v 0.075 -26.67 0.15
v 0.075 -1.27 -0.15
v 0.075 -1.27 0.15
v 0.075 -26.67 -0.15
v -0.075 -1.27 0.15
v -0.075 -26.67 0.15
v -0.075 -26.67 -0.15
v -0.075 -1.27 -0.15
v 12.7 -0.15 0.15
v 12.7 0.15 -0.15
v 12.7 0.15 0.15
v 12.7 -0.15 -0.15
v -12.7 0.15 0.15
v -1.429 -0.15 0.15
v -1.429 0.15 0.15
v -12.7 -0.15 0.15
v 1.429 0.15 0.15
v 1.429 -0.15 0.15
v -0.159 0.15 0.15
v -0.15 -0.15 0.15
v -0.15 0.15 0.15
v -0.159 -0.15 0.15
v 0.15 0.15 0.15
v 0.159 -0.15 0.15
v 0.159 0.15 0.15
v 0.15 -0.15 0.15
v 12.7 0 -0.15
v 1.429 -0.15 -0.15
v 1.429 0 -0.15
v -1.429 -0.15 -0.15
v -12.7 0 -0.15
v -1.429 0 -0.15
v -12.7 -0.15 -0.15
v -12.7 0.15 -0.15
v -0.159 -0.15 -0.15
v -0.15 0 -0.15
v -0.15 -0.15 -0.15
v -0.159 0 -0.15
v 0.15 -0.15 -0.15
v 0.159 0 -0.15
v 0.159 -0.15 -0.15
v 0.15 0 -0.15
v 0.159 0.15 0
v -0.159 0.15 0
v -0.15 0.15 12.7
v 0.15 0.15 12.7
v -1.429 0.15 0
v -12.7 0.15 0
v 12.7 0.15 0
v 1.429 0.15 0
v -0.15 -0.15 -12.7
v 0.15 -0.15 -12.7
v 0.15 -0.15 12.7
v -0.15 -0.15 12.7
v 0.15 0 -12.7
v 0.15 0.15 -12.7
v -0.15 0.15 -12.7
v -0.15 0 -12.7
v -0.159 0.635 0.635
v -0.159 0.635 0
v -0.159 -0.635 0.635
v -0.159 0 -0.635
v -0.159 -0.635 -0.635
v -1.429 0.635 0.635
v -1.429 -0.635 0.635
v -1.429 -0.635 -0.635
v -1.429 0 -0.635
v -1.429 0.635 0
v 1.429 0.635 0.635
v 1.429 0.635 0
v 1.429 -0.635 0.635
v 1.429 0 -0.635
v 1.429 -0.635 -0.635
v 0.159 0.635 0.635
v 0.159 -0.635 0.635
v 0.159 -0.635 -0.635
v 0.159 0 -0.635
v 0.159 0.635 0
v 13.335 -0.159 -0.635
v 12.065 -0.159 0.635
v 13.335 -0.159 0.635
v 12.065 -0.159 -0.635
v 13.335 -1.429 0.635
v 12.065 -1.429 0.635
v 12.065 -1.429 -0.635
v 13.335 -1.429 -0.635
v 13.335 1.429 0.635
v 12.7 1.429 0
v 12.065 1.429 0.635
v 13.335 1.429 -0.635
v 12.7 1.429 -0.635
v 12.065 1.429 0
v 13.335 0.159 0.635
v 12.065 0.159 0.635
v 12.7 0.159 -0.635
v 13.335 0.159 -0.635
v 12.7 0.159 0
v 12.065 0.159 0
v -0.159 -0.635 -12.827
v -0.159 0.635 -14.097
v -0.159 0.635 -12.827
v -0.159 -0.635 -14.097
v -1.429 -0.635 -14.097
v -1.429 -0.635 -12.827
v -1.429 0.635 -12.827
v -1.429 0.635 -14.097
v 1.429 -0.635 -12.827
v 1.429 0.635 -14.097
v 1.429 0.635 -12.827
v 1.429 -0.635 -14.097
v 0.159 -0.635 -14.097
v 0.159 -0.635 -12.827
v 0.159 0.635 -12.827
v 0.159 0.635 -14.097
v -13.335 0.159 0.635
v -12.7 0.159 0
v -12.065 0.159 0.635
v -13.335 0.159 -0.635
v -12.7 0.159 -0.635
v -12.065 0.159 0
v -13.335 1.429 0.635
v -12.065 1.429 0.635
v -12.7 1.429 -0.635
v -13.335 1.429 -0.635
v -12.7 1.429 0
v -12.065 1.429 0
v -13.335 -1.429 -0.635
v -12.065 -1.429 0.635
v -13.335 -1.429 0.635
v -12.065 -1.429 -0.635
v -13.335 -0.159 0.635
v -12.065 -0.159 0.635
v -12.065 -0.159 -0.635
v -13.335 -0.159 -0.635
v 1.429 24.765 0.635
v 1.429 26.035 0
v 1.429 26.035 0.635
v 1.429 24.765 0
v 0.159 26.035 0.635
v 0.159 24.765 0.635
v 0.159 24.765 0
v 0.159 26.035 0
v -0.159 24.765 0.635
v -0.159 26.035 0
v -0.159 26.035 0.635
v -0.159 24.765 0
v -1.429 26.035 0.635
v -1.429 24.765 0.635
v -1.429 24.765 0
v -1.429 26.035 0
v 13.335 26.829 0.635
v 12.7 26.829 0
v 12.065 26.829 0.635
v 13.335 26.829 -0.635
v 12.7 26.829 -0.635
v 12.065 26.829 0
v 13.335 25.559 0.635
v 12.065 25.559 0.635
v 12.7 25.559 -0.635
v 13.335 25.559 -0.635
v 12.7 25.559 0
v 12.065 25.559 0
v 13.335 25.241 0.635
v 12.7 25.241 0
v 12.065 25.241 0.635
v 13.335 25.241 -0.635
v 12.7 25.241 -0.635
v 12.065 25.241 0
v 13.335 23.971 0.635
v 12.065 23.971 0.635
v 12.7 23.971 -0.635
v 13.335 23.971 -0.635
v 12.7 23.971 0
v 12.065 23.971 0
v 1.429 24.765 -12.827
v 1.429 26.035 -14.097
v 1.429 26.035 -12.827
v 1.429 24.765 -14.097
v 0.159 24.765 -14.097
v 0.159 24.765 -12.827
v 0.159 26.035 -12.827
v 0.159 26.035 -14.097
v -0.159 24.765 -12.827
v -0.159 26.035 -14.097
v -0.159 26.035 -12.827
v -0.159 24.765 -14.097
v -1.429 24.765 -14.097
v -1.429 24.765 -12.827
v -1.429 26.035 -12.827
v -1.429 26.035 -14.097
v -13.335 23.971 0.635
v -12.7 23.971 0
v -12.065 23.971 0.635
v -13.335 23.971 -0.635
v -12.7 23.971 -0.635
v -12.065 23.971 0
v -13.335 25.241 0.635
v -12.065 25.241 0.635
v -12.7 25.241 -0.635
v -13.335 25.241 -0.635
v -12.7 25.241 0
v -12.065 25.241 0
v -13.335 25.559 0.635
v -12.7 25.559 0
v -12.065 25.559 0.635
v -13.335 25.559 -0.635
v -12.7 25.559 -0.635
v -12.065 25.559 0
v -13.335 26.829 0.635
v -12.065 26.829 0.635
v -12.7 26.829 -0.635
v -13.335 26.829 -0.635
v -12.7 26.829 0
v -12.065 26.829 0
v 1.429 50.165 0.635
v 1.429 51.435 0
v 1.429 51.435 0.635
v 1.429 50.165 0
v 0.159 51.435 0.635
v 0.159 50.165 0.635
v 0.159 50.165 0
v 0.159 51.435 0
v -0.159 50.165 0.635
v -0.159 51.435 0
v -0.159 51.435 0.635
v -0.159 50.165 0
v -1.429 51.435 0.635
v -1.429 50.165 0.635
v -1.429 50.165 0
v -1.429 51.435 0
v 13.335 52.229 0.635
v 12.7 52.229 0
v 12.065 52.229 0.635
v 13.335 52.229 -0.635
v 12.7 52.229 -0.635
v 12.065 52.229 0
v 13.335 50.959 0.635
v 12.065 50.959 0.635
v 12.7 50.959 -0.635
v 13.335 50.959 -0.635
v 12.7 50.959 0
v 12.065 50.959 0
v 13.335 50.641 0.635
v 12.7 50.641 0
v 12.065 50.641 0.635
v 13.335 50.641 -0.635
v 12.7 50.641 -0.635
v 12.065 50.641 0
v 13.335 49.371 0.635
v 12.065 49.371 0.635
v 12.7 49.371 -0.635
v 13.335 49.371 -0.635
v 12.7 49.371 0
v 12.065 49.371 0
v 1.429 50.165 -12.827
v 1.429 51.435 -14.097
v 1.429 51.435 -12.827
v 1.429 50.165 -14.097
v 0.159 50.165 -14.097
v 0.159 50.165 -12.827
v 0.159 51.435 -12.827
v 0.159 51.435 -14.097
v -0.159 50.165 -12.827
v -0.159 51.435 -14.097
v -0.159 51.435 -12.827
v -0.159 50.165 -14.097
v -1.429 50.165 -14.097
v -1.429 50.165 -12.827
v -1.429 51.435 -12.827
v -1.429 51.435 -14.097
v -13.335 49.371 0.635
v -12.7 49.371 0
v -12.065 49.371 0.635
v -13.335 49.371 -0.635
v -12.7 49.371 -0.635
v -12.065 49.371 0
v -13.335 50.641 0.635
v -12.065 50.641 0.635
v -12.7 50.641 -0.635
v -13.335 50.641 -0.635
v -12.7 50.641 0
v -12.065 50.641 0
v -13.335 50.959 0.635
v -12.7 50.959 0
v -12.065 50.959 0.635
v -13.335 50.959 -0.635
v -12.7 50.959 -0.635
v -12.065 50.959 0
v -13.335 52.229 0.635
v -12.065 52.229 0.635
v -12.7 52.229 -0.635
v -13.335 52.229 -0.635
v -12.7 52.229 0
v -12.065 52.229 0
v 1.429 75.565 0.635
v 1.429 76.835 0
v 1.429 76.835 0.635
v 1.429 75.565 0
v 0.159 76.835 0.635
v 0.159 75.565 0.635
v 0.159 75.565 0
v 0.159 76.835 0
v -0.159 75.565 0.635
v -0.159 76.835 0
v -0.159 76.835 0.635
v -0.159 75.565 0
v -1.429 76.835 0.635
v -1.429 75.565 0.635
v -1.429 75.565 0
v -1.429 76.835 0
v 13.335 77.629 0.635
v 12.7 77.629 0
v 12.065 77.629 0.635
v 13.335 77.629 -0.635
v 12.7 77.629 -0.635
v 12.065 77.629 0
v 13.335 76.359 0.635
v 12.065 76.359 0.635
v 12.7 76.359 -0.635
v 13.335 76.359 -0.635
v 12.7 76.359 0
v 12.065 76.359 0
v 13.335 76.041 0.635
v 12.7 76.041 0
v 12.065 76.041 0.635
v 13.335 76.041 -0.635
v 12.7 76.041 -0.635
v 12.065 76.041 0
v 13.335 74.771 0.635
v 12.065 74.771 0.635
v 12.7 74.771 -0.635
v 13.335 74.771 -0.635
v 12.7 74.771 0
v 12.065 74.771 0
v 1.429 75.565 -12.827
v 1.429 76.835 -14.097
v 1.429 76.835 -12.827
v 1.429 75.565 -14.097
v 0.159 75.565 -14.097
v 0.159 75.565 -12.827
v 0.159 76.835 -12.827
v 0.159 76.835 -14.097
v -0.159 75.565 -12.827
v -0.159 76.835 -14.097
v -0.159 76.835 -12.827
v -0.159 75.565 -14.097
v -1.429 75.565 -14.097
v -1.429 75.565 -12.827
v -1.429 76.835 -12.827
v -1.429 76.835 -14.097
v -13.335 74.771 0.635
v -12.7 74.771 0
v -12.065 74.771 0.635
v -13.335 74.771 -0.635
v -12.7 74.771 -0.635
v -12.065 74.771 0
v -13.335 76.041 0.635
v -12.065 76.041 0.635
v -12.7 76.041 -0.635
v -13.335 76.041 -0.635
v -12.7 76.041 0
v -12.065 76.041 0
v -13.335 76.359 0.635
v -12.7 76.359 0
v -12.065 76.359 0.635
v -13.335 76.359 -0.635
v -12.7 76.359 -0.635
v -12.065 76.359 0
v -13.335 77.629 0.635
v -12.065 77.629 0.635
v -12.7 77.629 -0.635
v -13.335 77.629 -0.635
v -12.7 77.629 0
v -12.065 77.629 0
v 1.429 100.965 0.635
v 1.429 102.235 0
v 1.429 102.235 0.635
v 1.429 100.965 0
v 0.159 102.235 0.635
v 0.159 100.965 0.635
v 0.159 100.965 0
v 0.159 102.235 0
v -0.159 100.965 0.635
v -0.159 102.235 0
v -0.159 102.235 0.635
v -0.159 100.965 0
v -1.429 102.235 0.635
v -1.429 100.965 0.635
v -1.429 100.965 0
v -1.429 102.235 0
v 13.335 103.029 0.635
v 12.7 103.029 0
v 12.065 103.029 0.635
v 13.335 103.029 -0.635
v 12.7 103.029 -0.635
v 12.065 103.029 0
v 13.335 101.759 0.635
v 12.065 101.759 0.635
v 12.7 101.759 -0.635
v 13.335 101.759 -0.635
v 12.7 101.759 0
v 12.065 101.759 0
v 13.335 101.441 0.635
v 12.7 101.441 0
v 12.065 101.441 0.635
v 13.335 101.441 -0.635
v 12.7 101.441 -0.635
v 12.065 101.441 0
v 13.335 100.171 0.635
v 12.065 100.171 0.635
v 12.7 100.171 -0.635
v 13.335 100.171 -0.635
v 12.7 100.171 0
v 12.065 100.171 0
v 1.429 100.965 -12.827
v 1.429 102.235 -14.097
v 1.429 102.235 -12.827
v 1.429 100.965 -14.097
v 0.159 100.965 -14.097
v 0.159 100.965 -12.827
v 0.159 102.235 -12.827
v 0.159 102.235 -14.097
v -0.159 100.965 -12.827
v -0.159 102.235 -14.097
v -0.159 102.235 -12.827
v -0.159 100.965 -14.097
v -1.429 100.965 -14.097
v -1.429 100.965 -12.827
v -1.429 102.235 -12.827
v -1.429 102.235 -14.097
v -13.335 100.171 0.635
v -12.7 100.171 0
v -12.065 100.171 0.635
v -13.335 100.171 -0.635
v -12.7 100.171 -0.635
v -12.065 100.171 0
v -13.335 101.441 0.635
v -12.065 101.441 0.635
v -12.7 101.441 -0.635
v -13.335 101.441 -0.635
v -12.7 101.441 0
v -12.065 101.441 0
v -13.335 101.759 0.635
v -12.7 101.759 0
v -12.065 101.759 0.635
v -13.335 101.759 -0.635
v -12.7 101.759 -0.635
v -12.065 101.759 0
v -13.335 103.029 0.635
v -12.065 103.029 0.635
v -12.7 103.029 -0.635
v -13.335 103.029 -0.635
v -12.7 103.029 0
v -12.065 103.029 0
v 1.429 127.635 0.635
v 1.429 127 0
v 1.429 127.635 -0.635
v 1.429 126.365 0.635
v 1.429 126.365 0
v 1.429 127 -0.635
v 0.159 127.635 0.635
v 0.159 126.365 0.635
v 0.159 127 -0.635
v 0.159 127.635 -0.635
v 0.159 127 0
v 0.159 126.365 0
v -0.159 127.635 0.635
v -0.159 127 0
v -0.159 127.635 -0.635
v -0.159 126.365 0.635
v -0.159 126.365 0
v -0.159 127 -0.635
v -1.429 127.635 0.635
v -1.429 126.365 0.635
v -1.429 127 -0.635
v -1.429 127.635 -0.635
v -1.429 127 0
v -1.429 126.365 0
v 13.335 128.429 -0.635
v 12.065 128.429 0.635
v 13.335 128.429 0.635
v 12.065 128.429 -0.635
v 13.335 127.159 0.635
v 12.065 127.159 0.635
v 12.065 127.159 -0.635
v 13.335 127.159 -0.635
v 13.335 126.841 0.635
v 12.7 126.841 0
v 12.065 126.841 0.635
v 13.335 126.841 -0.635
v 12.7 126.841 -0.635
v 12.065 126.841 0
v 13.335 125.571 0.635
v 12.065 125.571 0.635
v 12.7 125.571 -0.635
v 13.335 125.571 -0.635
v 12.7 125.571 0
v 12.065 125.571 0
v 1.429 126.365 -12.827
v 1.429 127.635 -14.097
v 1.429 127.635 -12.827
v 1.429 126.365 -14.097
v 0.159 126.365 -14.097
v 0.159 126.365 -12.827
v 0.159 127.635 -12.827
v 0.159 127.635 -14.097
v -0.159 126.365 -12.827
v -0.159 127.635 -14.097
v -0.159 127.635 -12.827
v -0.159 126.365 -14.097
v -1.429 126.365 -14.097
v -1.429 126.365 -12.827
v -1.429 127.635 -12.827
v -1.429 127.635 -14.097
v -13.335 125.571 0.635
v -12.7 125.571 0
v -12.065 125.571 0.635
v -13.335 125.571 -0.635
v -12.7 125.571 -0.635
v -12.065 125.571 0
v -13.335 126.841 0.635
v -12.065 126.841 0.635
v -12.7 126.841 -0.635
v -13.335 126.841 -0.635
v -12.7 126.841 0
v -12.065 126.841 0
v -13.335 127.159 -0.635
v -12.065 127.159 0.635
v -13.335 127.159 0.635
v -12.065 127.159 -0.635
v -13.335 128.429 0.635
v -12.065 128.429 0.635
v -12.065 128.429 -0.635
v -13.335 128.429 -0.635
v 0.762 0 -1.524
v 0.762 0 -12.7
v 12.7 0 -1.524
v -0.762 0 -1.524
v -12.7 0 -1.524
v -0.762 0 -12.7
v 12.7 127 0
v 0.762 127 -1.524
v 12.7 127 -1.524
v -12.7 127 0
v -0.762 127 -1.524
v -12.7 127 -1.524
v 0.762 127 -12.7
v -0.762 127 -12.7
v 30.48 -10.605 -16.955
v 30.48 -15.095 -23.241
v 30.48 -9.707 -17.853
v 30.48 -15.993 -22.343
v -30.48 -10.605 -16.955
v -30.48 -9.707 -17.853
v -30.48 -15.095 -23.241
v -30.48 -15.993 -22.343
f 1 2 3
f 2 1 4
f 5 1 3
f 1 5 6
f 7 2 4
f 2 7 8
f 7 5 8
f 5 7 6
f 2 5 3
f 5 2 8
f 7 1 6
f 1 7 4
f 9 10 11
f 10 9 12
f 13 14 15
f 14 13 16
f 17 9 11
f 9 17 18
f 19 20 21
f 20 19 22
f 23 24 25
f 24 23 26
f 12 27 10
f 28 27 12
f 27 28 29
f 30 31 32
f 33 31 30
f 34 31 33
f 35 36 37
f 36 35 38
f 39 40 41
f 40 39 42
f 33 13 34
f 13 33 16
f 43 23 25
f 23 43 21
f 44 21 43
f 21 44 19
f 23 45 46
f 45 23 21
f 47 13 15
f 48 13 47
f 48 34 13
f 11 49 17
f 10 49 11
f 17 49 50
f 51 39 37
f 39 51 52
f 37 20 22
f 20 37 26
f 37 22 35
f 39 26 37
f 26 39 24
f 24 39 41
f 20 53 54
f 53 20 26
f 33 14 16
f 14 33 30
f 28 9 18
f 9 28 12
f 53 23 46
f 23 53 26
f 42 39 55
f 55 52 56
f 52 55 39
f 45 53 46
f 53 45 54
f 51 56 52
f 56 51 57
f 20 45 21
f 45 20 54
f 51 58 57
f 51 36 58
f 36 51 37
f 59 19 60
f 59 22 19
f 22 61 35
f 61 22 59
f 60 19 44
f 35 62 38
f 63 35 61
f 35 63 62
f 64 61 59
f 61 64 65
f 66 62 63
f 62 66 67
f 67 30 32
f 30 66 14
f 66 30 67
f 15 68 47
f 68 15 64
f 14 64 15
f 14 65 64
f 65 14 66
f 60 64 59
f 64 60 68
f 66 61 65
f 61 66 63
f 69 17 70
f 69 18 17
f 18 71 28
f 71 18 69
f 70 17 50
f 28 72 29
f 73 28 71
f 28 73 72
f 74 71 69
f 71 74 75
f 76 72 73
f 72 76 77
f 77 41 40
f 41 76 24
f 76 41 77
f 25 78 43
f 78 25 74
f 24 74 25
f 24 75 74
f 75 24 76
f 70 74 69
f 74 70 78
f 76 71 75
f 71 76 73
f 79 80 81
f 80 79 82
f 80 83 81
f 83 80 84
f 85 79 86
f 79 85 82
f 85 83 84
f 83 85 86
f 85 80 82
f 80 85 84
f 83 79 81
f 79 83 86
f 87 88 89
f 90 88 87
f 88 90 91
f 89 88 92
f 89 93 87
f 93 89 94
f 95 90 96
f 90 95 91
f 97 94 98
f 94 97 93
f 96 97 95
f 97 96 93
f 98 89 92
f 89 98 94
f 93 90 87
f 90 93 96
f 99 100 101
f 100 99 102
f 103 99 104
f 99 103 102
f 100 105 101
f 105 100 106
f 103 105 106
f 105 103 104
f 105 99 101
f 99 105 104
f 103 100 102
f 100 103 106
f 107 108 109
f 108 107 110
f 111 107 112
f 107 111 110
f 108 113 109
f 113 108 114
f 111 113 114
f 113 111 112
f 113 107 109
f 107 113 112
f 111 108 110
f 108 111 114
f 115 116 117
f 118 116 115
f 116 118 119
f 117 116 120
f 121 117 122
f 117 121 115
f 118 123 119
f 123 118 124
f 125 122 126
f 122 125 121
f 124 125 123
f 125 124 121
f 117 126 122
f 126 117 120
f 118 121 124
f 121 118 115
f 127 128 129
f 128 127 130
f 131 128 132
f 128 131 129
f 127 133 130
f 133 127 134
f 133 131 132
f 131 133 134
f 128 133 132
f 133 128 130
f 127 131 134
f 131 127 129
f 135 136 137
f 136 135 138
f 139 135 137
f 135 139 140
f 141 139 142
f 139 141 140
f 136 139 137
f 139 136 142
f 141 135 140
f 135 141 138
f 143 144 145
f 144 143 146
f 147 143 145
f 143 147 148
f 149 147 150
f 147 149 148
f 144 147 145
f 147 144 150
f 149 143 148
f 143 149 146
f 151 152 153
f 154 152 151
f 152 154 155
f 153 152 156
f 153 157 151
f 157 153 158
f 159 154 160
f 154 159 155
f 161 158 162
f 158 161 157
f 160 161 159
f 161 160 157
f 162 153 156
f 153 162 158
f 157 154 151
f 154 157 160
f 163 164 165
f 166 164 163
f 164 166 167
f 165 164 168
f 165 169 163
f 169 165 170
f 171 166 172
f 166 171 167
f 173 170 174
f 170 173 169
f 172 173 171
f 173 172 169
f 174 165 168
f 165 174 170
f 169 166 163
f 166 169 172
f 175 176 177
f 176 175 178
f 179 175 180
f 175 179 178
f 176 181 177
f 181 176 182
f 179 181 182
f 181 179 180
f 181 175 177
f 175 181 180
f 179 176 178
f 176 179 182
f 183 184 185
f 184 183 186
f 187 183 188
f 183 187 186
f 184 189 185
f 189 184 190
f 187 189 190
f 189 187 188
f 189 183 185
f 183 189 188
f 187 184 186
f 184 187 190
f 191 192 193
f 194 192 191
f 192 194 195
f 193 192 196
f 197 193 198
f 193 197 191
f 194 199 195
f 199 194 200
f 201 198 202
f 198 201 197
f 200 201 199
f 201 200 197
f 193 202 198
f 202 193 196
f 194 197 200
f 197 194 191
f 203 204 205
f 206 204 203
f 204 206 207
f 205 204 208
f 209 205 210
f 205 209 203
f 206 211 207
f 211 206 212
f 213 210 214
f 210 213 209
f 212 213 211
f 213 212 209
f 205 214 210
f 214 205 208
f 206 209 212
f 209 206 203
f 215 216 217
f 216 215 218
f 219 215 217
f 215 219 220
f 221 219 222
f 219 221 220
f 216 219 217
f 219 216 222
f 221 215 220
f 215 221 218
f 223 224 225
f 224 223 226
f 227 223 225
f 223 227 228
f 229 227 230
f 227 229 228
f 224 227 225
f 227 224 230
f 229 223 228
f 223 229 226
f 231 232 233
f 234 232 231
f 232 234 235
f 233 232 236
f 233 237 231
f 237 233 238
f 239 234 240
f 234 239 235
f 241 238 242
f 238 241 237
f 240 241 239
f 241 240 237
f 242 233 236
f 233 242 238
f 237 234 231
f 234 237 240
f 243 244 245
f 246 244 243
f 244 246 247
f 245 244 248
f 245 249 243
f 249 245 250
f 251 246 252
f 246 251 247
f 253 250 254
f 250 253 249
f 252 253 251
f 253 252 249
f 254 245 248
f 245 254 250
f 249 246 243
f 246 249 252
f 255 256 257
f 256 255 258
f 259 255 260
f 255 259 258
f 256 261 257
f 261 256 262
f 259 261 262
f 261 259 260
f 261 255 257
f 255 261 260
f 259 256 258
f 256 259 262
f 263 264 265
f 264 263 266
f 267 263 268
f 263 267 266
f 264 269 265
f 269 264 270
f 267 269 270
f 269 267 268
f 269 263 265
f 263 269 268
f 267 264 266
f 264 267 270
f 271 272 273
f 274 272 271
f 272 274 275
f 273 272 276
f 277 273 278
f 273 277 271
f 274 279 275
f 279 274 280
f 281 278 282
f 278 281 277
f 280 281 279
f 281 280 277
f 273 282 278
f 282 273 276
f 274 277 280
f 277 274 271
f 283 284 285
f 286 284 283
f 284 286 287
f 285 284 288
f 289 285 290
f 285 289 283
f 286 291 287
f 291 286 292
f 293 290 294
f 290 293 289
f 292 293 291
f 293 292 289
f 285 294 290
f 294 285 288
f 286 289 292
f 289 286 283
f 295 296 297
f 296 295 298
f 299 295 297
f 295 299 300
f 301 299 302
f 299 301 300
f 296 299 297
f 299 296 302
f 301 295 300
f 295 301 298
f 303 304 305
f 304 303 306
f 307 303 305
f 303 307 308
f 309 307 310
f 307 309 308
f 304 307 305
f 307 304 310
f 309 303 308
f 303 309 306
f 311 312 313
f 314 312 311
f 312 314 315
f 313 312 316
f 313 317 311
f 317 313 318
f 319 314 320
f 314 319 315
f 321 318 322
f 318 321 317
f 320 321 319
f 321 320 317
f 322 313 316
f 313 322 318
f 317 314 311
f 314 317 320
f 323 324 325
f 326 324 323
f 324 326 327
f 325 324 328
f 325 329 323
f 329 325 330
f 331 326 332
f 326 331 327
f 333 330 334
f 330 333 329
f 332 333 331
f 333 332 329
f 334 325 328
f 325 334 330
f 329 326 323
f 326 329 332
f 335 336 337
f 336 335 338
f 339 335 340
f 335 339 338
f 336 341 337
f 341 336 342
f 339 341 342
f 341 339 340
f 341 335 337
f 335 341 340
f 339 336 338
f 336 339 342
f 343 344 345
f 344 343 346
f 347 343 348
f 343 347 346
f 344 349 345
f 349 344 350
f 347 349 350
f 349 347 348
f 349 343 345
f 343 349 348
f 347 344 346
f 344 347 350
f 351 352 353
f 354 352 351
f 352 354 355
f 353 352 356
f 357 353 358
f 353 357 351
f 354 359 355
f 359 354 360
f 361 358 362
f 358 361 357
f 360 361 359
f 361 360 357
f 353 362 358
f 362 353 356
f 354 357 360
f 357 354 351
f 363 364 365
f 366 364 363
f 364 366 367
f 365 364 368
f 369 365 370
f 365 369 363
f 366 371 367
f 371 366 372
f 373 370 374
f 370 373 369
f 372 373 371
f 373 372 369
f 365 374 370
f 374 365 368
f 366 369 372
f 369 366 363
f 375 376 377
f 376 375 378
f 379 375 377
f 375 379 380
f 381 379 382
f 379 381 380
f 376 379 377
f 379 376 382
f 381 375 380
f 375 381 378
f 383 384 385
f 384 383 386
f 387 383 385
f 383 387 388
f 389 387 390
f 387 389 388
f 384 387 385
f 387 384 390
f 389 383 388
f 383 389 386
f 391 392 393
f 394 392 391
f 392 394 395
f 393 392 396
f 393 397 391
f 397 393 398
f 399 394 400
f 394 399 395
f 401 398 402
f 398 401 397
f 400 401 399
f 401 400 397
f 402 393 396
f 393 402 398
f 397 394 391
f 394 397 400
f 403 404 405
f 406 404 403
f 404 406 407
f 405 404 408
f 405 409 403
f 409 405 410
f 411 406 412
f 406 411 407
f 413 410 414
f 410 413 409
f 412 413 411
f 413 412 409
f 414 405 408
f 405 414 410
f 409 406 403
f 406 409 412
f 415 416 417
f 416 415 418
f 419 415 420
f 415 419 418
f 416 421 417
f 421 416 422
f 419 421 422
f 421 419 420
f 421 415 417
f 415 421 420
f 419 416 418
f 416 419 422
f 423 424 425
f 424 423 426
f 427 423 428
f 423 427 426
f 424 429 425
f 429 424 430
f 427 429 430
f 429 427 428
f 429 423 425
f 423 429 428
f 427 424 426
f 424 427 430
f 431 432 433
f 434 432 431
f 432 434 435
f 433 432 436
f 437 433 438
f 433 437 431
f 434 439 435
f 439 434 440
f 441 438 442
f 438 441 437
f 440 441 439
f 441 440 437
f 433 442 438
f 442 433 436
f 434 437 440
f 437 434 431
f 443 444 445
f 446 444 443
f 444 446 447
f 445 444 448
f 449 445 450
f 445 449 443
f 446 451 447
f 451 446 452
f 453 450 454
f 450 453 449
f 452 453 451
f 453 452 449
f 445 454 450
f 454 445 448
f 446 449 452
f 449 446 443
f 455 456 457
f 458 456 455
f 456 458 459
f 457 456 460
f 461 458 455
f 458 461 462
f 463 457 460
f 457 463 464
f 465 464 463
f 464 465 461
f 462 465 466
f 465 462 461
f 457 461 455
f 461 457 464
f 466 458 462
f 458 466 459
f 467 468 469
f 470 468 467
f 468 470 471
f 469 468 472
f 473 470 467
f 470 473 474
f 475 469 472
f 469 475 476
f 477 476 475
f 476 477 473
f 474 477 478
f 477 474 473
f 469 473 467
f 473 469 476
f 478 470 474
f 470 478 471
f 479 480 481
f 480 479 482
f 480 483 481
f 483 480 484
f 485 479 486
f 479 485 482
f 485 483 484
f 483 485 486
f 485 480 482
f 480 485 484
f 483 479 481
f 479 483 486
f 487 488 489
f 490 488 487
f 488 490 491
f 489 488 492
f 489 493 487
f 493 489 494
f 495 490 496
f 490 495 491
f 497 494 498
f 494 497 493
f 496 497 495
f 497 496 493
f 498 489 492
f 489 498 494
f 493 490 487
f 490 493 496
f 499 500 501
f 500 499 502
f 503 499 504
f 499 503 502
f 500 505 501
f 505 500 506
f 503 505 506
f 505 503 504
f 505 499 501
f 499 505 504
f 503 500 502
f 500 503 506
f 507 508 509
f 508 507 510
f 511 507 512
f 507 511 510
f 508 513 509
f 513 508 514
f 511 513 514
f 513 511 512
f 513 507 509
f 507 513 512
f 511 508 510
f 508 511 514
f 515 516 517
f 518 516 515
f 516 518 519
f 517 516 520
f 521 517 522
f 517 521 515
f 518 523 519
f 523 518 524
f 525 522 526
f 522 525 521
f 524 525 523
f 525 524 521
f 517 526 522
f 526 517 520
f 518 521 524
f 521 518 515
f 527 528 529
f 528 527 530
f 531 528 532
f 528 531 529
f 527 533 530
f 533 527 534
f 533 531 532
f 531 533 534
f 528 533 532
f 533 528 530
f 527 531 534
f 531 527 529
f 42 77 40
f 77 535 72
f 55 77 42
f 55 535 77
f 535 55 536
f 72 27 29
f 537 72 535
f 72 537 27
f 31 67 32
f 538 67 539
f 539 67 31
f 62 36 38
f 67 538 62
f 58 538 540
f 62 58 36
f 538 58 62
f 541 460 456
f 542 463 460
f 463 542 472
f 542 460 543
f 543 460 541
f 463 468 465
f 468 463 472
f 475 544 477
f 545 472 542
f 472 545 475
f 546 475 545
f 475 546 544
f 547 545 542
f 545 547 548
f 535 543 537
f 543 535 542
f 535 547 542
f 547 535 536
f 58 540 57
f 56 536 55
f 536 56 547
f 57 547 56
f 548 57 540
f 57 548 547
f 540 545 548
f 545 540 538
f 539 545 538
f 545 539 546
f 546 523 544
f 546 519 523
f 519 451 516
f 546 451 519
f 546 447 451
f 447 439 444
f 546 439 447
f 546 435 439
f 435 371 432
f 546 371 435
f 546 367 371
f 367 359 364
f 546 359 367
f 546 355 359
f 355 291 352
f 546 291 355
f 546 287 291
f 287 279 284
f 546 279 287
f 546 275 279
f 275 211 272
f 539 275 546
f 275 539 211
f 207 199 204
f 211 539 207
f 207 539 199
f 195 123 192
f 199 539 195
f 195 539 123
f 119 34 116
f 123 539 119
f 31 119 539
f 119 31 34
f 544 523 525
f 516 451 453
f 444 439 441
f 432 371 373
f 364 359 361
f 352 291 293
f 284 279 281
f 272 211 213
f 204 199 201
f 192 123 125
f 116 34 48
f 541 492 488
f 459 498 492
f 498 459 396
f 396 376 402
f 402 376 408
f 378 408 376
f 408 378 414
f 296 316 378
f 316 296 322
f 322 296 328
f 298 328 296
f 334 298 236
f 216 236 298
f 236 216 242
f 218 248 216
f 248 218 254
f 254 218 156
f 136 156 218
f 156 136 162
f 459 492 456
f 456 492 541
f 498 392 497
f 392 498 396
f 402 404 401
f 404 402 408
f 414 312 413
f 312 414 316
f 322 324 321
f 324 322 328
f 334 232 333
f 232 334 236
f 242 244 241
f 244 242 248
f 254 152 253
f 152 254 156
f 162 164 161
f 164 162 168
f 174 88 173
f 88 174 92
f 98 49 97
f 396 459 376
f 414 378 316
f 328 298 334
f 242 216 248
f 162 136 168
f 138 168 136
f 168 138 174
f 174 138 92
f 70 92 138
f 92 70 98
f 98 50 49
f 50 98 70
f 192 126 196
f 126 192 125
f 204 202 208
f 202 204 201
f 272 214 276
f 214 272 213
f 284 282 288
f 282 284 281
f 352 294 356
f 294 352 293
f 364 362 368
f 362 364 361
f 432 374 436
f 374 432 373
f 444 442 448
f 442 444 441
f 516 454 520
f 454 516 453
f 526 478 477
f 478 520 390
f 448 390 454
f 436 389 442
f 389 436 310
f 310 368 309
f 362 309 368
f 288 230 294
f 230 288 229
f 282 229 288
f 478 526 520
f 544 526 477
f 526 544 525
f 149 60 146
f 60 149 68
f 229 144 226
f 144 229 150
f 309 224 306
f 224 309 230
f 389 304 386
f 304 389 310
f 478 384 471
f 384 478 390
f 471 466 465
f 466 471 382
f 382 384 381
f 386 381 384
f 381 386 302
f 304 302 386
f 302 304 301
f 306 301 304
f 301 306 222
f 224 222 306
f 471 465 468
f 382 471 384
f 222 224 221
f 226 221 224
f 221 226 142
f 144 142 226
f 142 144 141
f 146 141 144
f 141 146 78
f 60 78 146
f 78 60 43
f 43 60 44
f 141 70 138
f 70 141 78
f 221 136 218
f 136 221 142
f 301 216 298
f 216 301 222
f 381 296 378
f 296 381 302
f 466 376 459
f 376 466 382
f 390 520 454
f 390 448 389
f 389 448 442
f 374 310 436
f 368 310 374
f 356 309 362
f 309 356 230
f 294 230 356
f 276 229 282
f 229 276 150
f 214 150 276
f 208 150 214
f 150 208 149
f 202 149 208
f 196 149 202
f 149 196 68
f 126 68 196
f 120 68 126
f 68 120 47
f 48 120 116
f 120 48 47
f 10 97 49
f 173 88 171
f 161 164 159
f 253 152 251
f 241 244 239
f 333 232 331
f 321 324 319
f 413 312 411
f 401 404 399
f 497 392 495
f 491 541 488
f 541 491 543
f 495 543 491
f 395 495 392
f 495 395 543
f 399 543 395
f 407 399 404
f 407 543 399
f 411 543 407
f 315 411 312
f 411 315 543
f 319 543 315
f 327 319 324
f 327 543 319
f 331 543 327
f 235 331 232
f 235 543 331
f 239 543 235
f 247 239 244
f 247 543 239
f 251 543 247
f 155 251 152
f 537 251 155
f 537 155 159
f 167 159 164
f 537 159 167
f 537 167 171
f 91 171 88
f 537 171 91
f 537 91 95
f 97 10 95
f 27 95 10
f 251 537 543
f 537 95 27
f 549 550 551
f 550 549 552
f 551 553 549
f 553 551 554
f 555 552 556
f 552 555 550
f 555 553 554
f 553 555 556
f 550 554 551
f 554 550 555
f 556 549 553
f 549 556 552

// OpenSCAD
include <../mo/mo.scad>


SectionPositionCount = 4;

// Spec[ 0 ] = length
// Spec[ 1 ] = Width
// Spec[ 2 ] = Height
// Spec[ 3 ] = Thickness
// Spec[ 4 ] = position spacing

// Pos[ 0 ] = section
// Pos[ 1 ] = position index

module moTeeExtrusion( spec, p = [ 0, 0 ], info = false ) {
  color( Aluminum ) {
    moPitch( 3 ) {
      linear_extrude( height = spec[ 0 ] ) {   
        polygon( [ [ -spec[1]/2, 0 ], [ spec[1]/2, 0 ], [ spec[1]/2,spec[3] ], [ spec[3]/2,spec[3] ], [ spec[3]/2,spec[2] ], [ -spec[3]/2,spec[2] ], [ -spec[3]/2,spec[3] ], [-spec[1]/2,spec[3] ] ] );       
      }
    }
  }
  
  if ( info ) {
    moPartOrigin();
    for ( i = [ 0 : spec[ 0 ] / spec[ 4 ] ] )
      for ( j = [ 0 : SectionPositionCount - 1 ] ) {
        pi = [ i, j ];
        moMoveTo( moTeeExtrusionPosition( pi, spec ) )
          moPosition2( pi );
      }
  }

  if ( $name )
    moPartLabel( parent_module( 1 ) );

}

function moTeeExtrusionPositionSection( s, w, h, t ) = ( s == 0 ) ? [ [ 0, 0, 0 ], [ 0, 0, 1 ], 0 ] :
                                                            ( s == 1 ) ? [ [ w/2, 0, 0 ], [ 0, 0, 1 ], 90 ] :
                                                            ( s == 3 ) ? [ [ -w/2, 0, 0 ], [ 0, 0, 1 ], -90 ] :
                                                             [ [ 0, 0, -h - t / 2 ], [ 1, 0, 0 ], 90 ];

function moTeeExtrusionPosition( p = [0, 0 ], spec ) = moMoveToPosition( [ [ 0, p[0]*spec[4], 0 ], [ 1, 0, 0 ], 0 ], moTeeExtrusionPositionSection( p[ 1 ], spec[ 1 ], spec[ 2 ], spec[ 3 ] ) ); 


demoSpec = [ 5 * in, 1 * in, 0.5 * in, 0.06 * in, 1 * in ];

moMoveOriginTo( moTeeExtrusionPosition( [ 0, 0], demoSpec ) )
  moTeeExtrusion( demoSpec, [0,0], info = true, $name=true );
